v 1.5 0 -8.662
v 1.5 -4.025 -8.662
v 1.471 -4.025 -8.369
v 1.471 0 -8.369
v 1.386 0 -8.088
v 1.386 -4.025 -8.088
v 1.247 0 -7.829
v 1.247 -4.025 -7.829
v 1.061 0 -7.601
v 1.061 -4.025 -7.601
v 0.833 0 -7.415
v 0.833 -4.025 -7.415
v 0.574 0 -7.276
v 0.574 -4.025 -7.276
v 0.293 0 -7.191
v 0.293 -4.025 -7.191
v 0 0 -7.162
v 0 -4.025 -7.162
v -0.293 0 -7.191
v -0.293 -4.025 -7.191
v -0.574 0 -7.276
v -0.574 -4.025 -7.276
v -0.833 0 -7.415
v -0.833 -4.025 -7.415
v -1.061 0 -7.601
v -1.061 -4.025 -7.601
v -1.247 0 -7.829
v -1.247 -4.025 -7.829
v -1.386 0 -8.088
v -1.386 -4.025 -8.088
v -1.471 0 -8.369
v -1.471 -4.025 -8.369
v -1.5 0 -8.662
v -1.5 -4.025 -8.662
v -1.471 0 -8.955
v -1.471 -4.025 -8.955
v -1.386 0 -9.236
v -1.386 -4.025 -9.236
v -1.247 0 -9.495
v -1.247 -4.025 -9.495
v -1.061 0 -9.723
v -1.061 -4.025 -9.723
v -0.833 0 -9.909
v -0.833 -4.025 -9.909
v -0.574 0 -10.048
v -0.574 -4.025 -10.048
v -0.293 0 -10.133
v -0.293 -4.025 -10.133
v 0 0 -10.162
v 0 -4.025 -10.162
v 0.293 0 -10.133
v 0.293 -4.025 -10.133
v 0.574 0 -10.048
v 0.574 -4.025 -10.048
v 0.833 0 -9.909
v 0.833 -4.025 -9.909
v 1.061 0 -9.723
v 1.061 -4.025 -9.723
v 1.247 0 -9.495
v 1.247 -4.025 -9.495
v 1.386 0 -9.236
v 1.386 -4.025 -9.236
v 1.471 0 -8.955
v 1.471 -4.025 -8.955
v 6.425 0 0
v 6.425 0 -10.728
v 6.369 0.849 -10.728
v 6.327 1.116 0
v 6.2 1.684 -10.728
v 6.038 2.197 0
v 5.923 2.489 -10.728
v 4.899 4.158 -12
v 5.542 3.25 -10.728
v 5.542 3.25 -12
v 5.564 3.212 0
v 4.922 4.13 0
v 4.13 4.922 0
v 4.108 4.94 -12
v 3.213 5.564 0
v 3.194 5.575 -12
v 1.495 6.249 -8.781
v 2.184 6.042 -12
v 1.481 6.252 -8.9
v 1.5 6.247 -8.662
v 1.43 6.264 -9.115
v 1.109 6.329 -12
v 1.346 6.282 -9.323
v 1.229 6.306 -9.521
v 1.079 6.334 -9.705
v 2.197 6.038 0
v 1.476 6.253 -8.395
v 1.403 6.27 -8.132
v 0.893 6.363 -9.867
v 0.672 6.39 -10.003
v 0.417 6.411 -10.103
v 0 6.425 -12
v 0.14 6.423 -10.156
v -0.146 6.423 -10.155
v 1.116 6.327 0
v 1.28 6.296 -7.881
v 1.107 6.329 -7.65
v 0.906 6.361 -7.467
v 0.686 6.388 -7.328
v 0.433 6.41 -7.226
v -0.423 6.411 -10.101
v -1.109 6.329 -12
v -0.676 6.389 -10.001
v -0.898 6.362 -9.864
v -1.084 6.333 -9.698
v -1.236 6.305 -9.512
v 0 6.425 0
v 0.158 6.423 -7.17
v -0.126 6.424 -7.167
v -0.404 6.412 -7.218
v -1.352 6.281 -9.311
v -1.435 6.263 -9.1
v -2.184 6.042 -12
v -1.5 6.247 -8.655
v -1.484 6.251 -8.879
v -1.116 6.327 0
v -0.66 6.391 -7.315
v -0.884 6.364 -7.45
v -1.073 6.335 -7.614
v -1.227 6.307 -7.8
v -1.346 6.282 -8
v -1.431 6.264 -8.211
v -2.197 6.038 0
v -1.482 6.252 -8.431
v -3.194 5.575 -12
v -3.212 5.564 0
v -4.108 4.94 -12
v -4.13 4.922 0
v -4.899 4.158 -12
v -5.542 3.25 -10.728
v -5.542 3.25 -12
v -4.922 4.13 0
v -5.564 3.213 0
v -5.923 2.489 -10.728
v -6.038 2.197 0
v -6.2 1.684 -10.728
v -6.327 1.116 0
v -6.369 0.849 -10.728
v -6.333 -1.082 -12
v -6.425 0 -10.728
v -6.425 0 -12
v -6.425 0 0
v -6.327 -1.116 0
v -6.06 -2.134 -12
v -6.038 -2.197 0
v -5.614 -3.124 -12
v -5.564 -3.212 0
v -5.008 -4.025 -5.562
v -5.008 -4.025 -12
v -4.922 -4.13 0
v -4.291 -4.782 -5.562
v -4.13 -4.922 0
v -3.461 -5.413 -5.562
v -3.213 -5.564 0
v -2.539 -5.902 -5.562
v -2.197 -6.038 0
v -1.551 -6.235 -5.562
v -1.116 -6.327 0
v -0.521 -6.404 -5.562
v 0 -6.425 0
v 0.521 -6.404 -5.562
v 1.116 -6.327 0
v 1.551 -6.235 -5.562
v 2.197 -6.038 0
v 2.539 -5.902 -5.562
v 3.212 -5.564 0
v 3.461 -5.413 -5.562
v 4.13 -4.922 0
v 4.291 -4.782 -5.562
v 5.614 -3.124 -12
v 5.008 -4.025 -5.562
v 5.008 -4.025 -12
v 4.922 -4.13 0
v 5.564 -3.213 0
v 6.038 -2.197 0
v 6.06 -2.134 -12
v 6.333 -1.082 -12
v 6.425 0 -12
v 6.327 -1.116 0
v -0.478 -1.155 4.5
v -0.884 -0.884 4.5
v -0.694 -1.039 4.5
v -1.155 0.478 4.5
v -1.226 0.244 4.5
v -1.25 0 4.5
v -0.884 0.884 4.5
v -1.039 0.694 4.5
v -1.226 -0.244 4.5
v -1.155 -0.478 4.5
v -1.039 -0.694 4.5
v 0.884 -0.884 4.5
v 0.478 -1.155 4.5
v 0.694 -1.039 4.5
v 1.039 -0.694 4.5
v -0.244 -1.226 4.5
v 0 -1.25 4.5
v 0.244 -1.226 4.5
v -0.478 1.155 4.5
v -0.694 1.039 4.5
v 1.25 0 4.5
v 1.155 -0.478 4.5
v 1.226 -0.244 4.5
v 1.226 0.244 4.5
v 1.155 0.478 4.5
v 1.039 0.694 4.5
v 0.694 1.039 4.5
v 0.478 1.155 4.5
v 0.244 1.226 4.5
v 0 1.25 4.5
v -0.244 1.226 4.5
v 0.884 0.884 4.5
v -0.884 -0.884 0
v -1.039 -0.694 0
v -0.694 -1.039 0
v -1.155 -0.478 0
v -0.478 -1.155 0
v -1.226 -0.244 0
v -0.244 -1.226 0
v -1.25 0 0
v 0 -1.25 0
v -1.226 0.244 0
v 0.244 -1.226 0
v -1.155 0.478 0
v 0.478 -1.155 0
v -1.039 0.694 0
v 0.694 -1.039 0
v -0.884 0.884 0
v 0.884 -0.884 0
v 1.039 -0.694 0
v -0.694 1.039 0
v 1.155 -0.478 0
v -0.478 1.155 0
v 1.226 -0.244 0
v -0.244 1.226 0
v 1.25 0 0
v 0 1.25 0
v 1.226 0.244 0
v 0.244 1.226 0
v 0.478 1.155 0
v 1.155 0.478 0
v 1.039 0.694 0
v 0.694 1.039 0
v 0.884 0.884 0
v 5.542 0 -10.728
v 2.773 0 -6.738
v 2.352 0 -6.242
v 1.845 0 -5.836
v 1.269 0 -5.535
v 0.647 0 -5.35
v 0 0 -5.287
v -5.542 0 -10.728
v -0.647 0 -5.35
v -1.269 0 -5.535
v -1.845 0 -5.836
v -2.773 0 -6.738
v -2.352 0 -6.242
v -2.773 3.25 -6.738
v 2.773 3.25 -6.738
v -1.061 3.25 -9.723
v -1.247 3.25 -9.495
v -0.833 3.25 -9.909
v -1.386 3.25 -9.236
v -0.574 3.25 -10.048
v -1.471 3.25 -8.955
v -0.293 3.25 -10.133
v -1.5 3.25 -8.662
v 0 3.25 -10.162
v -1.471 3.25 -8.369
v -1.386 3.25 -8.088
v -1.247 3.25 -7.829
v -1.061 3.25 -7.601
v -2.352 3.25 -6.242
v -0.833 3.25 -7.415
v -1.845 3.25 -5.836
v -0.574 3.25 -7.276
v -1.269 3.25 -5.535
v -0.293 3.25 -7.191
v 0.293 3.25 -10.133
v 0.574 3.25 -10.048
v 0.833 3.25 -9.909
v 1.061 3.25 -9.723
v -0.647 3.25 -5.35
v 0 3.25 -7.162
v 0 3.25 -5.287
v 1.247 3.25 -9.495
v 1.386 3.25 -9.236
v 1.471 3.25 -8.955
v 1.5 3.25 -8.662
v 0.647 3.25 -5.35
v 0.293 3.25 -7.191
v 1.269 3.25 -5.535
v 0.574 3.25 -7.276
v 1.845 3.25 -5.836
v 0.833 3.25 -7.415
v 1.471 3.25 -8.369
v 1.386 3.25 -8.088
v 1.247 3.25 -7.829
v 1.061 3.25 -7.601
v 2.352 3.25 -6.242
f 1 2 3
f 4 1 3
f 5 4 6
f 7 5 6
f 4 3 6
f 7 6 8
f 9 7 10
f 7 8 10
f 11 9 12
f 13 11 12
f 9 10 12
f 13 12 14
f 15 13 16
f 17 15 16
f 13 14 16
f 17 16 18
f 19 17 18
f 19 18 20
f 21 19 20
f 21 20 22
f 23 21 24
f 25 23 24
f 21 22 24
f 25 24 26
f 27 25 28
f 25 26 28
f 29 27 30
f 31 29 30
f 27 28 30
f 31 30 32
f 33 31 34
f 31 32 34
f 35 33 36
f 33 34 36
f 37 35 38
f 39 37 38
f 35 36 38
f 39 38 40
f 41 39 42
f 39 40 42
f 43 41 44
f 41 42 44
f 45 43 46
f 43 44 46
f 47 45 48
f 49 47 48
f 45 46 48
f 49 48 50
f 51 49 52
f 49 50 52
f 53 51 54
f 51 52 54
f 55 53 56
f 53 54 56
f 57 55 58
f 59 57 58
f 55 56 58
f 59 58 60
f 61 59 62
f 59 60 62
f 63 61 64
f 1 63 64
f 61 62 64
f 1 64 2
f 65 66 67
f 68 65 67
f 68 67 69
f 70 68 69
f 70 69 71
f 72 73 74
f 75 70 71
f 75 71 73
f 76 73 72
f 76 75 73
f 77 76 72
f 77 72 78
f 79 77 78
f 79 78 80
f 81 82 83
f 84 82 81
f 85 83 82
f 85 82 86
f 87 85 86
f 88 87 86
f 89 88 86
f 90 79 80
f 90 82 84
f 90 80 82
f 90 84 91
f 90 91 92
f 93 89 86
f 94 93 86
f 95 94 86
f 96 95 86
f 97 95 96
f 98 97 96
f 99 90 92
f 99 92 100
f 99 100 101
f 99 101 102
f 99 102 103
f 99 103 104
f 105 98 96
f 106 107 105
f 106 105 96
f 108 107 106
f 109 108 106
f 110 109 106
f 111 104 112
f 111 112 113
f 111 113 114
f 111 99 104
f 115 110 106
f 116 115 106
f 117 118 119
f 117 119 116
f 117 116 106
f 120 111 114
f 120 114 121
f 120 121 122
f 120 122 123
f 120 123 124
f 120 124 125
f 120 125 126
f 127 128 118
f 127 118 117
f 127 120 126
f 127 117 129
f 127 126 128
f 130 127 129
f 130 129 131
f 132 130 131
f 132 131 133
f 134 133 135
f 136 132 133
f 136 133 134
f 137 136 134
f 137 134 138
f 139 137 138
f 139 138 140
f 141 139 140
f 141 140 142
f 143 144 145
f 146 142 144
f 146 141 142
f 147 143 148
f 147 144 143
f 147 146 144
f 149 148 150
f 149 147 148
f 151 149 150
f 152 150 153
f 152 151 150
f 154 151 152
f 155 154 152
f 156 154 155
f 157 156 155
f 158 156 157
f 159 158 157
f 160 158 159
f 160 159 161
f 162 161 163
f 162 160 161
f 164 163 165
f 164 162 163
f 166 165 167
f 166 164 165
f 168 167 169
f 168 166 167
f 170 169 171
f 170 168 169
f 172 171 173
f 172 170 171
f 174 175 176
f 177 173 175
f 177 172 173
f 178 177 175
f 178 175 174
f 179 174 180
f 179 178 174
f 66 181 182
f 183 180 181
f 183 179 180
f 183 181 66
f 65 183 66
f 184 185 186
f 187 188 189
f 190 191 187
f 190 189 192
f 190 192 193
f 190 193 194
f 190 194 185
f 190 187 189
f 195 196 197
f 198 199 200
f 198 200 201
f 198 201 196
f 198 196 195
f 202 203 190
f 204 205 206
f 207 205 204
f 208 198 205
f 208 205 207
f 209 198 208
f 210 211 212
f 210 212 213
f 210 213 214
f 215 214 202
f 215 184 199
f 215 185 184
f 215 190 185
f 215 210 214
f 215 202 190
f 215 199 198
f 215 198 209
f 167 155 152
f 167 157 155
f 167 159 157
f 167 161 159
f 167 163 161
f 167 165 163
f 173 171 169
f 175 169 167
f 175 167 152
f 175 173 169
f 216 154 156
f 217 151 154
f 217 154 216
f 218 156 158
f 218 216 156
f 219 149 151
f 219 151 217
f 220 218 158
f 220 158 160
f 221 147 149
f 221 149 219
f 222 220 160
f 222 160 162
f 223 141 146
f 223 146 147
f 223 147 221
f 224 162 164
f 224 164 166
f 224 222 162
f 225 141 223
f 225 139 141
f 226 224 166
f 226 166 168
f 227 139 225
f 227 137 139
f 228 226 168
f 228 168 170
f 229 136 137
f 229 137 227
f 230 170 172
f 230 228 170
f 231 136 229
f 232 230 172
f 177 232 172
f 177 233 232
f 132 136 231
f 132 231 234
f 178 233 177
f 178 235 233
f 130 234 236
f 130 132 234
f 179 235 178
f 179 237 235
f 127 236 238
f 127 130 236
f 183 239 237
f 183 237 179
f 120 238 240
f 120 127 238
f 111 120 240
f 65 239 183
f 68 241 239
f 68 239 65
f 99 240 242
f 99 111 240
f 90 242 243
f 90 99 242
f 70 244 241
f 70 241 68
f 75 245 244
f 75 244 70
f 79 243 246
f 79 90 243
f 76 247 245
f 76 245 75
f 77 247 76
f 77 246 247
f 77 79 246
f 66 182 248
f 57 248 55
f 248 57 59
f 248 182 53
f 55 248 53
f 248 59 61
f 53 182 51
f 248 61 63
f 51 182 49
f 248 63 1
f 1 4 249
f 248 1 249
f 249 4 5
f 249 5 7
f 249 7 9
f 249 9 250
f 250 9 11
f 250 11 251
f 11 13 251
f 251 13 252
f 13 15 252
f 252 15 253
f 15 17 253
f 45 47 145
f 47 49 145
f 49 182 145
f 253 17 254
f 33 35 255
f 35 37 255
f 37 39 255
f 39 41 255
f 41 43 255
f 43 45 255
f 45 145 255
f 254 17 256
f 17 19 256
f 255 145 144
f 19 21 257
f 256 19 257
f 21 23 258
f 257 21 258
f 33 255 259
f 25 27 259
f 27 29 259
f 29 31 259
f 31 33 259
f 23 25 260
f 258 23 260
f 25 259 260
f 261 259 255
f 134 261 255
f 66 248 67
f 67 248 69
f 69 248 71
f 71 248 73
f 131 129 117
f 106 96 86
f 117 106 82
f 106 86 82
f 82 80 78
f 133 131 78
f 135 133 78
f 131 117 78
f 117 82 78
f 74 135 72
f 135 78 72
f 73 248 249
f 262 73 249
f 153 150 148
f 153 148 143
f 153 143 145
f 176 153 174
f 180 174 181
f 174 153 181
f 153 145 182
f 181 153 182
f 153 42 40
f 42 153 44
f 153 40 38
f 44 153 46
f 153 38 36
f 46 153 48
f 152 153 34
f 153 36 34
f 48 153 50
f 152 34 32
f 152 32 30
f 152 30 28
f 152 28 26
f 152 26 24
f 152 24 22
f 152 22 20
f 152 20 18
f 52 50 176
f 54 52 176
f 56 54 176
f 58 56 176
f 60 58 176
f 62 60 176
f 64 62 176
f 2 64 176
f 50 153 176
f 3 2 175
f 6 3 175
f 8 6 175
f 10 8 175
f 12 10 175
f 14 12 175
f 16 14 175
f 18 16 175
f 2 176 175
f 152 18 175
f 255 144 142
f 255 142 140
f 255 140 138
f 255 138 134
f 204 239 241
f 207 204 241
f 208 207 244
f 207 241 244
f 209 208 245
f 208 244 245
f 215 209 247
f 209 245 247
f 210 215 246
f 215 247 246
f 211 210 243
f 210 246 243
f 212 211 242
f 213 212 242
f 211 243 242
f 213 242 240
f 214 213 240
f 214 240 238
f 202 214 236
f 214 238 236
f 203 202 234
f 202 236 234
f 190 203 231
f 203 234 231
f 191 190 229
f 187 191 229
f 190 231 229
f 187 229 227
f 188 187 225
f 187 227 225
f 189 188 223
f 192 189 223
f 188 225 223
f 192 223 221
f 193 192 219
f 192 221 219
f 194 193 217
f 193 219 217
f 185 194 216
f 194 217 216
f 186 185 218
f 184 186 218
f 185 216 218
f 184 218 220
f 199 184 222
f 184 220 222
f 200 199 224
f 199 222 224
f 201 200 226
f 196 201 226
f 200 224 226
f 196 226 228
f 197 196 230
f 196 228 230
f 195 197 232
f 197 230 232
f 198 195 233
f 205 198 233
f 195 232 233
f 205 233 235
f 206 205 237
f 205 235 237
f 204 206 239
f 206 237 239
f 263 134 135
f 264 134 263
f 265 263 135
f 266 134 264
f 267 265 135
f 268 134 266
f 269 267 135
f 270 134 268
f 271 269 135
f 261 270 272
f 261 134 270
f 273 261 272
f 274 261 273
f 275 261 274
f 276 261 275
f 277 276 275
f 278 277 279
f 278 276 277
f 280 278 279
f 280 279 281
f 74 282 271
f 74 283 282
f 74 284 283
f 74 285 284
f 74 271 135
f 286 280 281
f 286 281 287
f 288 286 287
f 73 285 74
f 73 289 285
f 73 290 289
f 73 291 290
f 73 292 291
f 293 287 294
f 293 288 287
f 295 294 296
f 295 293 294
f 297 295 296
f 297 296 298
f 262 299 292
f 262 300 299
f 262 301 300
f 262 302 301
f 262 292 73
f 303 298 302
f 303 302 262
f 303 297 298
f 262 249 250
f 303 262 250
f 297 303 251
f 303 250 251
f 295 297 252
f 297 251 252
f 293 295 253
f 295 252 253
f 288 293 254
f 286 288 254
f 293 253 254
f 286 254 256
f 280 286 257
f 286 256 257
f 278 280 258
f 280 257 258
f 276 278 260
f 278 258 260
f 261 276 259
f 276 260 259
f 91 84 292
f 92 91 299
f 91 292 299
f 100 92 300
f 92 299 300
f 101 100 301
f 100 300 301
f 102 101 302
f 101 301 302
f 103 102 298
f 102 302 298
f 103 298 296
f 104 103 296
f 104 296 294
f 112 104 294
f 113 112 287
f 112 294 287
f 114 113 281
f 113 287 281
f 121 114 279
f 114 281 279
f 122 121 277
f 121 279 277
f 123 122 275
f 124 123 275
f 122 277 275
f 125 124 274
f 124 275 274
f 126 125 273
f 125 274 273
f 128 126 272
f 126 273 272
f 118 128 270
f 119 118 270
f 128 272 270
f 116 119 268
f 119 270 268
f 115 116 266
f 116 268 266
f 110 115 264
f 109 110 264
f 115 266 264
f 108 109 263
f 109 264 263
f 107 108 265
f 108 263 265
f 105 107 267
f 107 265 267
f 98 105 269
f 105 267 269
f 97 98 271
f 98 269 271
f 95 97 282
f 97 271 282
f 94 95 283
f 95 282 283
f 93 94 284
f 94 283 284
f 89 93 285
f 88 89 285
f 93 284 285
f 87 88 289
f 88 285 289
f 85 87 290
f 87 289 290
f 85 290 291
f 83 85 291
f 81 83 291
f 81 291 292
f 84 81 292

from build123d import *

# Parameters (mm, degrees)
F0_R     = 6.425
F1_DEPTH = 12
F2_R     = 1.5
F3_DEPTH = 12.5
F5_DEPTH = 3.25
F6_W     = 3.25
F6_H     = 1.2716361485
F6_W_2   = 2.4
F6_H_2   = 1.6
F6_H_3   = 3
F6_H_4   = 1.8378814235
F7_DEPTH = 12.5
F8_R     = 1.25
F9_DEPTH = 4.5


with BuildPart() as f1:
    # F0 (on Top) → F1 (new body)
    with BuildSketch(Plane.XY):
        Circle(F0_R)
    extrude(amount=-F1_DEPTH)

    # F2 (on Front) → F3 (cut, symmetric)
    with BuildSketch(Plane.XZ):
        with Locations((0, -8.6621185765)):
            Circle(F2_R)
    extrude(amount=F3_DEPTH, both=True, mode=Mode.SUBTRACT)

    # F4 (on Front) → F5 (cut)
    with BuildSketch(Plane.XZ):
        with BuildLine():
            Line((6.425, -12), (2.7726078369, -6.7377301586))
            ThreePointArc((2.7726078369, -6.7377301586), (0, -5.2871185765), (-2.7726078369, -6.7377301586))
            Line((-2.7726078369, -6.7377301586), (-6.425, -12))
            Line((-6.425, -12), (6.425, -12))
        make_face()
    extrude(amount=-F5_DEPTH, mode=Mode.SUBTRACT)

    # F6 (on Right) → F7 (cut, symmetric)
    with BuildSketch(Plane.YZ):
        with Locations((1.625, -11.3641819257)):
            Rectangle(F6_W, F6_H)
        with Locations((-5.225, -6.3621185765)):
            Rectangle(F6_W_2, F6_H_2)
        with Locations((-5.225, -8.6621185765)):
            Rectangle(F6_W_2, F6_H_3)
        with Locations((-5.225, -11.0810592882)):
            Rectangle(F6_W_2, F6_H_4)
    extrude(amount=F7_DEPTH, both=True, mode=Mode.SUBTRACT)

    # F8 (on face) → F9 (join)
    with BuildSketch(Plane.XY):
        Circle(F8_R)
    extrude(amount=F9_DEPTH)


solid = f1.part
